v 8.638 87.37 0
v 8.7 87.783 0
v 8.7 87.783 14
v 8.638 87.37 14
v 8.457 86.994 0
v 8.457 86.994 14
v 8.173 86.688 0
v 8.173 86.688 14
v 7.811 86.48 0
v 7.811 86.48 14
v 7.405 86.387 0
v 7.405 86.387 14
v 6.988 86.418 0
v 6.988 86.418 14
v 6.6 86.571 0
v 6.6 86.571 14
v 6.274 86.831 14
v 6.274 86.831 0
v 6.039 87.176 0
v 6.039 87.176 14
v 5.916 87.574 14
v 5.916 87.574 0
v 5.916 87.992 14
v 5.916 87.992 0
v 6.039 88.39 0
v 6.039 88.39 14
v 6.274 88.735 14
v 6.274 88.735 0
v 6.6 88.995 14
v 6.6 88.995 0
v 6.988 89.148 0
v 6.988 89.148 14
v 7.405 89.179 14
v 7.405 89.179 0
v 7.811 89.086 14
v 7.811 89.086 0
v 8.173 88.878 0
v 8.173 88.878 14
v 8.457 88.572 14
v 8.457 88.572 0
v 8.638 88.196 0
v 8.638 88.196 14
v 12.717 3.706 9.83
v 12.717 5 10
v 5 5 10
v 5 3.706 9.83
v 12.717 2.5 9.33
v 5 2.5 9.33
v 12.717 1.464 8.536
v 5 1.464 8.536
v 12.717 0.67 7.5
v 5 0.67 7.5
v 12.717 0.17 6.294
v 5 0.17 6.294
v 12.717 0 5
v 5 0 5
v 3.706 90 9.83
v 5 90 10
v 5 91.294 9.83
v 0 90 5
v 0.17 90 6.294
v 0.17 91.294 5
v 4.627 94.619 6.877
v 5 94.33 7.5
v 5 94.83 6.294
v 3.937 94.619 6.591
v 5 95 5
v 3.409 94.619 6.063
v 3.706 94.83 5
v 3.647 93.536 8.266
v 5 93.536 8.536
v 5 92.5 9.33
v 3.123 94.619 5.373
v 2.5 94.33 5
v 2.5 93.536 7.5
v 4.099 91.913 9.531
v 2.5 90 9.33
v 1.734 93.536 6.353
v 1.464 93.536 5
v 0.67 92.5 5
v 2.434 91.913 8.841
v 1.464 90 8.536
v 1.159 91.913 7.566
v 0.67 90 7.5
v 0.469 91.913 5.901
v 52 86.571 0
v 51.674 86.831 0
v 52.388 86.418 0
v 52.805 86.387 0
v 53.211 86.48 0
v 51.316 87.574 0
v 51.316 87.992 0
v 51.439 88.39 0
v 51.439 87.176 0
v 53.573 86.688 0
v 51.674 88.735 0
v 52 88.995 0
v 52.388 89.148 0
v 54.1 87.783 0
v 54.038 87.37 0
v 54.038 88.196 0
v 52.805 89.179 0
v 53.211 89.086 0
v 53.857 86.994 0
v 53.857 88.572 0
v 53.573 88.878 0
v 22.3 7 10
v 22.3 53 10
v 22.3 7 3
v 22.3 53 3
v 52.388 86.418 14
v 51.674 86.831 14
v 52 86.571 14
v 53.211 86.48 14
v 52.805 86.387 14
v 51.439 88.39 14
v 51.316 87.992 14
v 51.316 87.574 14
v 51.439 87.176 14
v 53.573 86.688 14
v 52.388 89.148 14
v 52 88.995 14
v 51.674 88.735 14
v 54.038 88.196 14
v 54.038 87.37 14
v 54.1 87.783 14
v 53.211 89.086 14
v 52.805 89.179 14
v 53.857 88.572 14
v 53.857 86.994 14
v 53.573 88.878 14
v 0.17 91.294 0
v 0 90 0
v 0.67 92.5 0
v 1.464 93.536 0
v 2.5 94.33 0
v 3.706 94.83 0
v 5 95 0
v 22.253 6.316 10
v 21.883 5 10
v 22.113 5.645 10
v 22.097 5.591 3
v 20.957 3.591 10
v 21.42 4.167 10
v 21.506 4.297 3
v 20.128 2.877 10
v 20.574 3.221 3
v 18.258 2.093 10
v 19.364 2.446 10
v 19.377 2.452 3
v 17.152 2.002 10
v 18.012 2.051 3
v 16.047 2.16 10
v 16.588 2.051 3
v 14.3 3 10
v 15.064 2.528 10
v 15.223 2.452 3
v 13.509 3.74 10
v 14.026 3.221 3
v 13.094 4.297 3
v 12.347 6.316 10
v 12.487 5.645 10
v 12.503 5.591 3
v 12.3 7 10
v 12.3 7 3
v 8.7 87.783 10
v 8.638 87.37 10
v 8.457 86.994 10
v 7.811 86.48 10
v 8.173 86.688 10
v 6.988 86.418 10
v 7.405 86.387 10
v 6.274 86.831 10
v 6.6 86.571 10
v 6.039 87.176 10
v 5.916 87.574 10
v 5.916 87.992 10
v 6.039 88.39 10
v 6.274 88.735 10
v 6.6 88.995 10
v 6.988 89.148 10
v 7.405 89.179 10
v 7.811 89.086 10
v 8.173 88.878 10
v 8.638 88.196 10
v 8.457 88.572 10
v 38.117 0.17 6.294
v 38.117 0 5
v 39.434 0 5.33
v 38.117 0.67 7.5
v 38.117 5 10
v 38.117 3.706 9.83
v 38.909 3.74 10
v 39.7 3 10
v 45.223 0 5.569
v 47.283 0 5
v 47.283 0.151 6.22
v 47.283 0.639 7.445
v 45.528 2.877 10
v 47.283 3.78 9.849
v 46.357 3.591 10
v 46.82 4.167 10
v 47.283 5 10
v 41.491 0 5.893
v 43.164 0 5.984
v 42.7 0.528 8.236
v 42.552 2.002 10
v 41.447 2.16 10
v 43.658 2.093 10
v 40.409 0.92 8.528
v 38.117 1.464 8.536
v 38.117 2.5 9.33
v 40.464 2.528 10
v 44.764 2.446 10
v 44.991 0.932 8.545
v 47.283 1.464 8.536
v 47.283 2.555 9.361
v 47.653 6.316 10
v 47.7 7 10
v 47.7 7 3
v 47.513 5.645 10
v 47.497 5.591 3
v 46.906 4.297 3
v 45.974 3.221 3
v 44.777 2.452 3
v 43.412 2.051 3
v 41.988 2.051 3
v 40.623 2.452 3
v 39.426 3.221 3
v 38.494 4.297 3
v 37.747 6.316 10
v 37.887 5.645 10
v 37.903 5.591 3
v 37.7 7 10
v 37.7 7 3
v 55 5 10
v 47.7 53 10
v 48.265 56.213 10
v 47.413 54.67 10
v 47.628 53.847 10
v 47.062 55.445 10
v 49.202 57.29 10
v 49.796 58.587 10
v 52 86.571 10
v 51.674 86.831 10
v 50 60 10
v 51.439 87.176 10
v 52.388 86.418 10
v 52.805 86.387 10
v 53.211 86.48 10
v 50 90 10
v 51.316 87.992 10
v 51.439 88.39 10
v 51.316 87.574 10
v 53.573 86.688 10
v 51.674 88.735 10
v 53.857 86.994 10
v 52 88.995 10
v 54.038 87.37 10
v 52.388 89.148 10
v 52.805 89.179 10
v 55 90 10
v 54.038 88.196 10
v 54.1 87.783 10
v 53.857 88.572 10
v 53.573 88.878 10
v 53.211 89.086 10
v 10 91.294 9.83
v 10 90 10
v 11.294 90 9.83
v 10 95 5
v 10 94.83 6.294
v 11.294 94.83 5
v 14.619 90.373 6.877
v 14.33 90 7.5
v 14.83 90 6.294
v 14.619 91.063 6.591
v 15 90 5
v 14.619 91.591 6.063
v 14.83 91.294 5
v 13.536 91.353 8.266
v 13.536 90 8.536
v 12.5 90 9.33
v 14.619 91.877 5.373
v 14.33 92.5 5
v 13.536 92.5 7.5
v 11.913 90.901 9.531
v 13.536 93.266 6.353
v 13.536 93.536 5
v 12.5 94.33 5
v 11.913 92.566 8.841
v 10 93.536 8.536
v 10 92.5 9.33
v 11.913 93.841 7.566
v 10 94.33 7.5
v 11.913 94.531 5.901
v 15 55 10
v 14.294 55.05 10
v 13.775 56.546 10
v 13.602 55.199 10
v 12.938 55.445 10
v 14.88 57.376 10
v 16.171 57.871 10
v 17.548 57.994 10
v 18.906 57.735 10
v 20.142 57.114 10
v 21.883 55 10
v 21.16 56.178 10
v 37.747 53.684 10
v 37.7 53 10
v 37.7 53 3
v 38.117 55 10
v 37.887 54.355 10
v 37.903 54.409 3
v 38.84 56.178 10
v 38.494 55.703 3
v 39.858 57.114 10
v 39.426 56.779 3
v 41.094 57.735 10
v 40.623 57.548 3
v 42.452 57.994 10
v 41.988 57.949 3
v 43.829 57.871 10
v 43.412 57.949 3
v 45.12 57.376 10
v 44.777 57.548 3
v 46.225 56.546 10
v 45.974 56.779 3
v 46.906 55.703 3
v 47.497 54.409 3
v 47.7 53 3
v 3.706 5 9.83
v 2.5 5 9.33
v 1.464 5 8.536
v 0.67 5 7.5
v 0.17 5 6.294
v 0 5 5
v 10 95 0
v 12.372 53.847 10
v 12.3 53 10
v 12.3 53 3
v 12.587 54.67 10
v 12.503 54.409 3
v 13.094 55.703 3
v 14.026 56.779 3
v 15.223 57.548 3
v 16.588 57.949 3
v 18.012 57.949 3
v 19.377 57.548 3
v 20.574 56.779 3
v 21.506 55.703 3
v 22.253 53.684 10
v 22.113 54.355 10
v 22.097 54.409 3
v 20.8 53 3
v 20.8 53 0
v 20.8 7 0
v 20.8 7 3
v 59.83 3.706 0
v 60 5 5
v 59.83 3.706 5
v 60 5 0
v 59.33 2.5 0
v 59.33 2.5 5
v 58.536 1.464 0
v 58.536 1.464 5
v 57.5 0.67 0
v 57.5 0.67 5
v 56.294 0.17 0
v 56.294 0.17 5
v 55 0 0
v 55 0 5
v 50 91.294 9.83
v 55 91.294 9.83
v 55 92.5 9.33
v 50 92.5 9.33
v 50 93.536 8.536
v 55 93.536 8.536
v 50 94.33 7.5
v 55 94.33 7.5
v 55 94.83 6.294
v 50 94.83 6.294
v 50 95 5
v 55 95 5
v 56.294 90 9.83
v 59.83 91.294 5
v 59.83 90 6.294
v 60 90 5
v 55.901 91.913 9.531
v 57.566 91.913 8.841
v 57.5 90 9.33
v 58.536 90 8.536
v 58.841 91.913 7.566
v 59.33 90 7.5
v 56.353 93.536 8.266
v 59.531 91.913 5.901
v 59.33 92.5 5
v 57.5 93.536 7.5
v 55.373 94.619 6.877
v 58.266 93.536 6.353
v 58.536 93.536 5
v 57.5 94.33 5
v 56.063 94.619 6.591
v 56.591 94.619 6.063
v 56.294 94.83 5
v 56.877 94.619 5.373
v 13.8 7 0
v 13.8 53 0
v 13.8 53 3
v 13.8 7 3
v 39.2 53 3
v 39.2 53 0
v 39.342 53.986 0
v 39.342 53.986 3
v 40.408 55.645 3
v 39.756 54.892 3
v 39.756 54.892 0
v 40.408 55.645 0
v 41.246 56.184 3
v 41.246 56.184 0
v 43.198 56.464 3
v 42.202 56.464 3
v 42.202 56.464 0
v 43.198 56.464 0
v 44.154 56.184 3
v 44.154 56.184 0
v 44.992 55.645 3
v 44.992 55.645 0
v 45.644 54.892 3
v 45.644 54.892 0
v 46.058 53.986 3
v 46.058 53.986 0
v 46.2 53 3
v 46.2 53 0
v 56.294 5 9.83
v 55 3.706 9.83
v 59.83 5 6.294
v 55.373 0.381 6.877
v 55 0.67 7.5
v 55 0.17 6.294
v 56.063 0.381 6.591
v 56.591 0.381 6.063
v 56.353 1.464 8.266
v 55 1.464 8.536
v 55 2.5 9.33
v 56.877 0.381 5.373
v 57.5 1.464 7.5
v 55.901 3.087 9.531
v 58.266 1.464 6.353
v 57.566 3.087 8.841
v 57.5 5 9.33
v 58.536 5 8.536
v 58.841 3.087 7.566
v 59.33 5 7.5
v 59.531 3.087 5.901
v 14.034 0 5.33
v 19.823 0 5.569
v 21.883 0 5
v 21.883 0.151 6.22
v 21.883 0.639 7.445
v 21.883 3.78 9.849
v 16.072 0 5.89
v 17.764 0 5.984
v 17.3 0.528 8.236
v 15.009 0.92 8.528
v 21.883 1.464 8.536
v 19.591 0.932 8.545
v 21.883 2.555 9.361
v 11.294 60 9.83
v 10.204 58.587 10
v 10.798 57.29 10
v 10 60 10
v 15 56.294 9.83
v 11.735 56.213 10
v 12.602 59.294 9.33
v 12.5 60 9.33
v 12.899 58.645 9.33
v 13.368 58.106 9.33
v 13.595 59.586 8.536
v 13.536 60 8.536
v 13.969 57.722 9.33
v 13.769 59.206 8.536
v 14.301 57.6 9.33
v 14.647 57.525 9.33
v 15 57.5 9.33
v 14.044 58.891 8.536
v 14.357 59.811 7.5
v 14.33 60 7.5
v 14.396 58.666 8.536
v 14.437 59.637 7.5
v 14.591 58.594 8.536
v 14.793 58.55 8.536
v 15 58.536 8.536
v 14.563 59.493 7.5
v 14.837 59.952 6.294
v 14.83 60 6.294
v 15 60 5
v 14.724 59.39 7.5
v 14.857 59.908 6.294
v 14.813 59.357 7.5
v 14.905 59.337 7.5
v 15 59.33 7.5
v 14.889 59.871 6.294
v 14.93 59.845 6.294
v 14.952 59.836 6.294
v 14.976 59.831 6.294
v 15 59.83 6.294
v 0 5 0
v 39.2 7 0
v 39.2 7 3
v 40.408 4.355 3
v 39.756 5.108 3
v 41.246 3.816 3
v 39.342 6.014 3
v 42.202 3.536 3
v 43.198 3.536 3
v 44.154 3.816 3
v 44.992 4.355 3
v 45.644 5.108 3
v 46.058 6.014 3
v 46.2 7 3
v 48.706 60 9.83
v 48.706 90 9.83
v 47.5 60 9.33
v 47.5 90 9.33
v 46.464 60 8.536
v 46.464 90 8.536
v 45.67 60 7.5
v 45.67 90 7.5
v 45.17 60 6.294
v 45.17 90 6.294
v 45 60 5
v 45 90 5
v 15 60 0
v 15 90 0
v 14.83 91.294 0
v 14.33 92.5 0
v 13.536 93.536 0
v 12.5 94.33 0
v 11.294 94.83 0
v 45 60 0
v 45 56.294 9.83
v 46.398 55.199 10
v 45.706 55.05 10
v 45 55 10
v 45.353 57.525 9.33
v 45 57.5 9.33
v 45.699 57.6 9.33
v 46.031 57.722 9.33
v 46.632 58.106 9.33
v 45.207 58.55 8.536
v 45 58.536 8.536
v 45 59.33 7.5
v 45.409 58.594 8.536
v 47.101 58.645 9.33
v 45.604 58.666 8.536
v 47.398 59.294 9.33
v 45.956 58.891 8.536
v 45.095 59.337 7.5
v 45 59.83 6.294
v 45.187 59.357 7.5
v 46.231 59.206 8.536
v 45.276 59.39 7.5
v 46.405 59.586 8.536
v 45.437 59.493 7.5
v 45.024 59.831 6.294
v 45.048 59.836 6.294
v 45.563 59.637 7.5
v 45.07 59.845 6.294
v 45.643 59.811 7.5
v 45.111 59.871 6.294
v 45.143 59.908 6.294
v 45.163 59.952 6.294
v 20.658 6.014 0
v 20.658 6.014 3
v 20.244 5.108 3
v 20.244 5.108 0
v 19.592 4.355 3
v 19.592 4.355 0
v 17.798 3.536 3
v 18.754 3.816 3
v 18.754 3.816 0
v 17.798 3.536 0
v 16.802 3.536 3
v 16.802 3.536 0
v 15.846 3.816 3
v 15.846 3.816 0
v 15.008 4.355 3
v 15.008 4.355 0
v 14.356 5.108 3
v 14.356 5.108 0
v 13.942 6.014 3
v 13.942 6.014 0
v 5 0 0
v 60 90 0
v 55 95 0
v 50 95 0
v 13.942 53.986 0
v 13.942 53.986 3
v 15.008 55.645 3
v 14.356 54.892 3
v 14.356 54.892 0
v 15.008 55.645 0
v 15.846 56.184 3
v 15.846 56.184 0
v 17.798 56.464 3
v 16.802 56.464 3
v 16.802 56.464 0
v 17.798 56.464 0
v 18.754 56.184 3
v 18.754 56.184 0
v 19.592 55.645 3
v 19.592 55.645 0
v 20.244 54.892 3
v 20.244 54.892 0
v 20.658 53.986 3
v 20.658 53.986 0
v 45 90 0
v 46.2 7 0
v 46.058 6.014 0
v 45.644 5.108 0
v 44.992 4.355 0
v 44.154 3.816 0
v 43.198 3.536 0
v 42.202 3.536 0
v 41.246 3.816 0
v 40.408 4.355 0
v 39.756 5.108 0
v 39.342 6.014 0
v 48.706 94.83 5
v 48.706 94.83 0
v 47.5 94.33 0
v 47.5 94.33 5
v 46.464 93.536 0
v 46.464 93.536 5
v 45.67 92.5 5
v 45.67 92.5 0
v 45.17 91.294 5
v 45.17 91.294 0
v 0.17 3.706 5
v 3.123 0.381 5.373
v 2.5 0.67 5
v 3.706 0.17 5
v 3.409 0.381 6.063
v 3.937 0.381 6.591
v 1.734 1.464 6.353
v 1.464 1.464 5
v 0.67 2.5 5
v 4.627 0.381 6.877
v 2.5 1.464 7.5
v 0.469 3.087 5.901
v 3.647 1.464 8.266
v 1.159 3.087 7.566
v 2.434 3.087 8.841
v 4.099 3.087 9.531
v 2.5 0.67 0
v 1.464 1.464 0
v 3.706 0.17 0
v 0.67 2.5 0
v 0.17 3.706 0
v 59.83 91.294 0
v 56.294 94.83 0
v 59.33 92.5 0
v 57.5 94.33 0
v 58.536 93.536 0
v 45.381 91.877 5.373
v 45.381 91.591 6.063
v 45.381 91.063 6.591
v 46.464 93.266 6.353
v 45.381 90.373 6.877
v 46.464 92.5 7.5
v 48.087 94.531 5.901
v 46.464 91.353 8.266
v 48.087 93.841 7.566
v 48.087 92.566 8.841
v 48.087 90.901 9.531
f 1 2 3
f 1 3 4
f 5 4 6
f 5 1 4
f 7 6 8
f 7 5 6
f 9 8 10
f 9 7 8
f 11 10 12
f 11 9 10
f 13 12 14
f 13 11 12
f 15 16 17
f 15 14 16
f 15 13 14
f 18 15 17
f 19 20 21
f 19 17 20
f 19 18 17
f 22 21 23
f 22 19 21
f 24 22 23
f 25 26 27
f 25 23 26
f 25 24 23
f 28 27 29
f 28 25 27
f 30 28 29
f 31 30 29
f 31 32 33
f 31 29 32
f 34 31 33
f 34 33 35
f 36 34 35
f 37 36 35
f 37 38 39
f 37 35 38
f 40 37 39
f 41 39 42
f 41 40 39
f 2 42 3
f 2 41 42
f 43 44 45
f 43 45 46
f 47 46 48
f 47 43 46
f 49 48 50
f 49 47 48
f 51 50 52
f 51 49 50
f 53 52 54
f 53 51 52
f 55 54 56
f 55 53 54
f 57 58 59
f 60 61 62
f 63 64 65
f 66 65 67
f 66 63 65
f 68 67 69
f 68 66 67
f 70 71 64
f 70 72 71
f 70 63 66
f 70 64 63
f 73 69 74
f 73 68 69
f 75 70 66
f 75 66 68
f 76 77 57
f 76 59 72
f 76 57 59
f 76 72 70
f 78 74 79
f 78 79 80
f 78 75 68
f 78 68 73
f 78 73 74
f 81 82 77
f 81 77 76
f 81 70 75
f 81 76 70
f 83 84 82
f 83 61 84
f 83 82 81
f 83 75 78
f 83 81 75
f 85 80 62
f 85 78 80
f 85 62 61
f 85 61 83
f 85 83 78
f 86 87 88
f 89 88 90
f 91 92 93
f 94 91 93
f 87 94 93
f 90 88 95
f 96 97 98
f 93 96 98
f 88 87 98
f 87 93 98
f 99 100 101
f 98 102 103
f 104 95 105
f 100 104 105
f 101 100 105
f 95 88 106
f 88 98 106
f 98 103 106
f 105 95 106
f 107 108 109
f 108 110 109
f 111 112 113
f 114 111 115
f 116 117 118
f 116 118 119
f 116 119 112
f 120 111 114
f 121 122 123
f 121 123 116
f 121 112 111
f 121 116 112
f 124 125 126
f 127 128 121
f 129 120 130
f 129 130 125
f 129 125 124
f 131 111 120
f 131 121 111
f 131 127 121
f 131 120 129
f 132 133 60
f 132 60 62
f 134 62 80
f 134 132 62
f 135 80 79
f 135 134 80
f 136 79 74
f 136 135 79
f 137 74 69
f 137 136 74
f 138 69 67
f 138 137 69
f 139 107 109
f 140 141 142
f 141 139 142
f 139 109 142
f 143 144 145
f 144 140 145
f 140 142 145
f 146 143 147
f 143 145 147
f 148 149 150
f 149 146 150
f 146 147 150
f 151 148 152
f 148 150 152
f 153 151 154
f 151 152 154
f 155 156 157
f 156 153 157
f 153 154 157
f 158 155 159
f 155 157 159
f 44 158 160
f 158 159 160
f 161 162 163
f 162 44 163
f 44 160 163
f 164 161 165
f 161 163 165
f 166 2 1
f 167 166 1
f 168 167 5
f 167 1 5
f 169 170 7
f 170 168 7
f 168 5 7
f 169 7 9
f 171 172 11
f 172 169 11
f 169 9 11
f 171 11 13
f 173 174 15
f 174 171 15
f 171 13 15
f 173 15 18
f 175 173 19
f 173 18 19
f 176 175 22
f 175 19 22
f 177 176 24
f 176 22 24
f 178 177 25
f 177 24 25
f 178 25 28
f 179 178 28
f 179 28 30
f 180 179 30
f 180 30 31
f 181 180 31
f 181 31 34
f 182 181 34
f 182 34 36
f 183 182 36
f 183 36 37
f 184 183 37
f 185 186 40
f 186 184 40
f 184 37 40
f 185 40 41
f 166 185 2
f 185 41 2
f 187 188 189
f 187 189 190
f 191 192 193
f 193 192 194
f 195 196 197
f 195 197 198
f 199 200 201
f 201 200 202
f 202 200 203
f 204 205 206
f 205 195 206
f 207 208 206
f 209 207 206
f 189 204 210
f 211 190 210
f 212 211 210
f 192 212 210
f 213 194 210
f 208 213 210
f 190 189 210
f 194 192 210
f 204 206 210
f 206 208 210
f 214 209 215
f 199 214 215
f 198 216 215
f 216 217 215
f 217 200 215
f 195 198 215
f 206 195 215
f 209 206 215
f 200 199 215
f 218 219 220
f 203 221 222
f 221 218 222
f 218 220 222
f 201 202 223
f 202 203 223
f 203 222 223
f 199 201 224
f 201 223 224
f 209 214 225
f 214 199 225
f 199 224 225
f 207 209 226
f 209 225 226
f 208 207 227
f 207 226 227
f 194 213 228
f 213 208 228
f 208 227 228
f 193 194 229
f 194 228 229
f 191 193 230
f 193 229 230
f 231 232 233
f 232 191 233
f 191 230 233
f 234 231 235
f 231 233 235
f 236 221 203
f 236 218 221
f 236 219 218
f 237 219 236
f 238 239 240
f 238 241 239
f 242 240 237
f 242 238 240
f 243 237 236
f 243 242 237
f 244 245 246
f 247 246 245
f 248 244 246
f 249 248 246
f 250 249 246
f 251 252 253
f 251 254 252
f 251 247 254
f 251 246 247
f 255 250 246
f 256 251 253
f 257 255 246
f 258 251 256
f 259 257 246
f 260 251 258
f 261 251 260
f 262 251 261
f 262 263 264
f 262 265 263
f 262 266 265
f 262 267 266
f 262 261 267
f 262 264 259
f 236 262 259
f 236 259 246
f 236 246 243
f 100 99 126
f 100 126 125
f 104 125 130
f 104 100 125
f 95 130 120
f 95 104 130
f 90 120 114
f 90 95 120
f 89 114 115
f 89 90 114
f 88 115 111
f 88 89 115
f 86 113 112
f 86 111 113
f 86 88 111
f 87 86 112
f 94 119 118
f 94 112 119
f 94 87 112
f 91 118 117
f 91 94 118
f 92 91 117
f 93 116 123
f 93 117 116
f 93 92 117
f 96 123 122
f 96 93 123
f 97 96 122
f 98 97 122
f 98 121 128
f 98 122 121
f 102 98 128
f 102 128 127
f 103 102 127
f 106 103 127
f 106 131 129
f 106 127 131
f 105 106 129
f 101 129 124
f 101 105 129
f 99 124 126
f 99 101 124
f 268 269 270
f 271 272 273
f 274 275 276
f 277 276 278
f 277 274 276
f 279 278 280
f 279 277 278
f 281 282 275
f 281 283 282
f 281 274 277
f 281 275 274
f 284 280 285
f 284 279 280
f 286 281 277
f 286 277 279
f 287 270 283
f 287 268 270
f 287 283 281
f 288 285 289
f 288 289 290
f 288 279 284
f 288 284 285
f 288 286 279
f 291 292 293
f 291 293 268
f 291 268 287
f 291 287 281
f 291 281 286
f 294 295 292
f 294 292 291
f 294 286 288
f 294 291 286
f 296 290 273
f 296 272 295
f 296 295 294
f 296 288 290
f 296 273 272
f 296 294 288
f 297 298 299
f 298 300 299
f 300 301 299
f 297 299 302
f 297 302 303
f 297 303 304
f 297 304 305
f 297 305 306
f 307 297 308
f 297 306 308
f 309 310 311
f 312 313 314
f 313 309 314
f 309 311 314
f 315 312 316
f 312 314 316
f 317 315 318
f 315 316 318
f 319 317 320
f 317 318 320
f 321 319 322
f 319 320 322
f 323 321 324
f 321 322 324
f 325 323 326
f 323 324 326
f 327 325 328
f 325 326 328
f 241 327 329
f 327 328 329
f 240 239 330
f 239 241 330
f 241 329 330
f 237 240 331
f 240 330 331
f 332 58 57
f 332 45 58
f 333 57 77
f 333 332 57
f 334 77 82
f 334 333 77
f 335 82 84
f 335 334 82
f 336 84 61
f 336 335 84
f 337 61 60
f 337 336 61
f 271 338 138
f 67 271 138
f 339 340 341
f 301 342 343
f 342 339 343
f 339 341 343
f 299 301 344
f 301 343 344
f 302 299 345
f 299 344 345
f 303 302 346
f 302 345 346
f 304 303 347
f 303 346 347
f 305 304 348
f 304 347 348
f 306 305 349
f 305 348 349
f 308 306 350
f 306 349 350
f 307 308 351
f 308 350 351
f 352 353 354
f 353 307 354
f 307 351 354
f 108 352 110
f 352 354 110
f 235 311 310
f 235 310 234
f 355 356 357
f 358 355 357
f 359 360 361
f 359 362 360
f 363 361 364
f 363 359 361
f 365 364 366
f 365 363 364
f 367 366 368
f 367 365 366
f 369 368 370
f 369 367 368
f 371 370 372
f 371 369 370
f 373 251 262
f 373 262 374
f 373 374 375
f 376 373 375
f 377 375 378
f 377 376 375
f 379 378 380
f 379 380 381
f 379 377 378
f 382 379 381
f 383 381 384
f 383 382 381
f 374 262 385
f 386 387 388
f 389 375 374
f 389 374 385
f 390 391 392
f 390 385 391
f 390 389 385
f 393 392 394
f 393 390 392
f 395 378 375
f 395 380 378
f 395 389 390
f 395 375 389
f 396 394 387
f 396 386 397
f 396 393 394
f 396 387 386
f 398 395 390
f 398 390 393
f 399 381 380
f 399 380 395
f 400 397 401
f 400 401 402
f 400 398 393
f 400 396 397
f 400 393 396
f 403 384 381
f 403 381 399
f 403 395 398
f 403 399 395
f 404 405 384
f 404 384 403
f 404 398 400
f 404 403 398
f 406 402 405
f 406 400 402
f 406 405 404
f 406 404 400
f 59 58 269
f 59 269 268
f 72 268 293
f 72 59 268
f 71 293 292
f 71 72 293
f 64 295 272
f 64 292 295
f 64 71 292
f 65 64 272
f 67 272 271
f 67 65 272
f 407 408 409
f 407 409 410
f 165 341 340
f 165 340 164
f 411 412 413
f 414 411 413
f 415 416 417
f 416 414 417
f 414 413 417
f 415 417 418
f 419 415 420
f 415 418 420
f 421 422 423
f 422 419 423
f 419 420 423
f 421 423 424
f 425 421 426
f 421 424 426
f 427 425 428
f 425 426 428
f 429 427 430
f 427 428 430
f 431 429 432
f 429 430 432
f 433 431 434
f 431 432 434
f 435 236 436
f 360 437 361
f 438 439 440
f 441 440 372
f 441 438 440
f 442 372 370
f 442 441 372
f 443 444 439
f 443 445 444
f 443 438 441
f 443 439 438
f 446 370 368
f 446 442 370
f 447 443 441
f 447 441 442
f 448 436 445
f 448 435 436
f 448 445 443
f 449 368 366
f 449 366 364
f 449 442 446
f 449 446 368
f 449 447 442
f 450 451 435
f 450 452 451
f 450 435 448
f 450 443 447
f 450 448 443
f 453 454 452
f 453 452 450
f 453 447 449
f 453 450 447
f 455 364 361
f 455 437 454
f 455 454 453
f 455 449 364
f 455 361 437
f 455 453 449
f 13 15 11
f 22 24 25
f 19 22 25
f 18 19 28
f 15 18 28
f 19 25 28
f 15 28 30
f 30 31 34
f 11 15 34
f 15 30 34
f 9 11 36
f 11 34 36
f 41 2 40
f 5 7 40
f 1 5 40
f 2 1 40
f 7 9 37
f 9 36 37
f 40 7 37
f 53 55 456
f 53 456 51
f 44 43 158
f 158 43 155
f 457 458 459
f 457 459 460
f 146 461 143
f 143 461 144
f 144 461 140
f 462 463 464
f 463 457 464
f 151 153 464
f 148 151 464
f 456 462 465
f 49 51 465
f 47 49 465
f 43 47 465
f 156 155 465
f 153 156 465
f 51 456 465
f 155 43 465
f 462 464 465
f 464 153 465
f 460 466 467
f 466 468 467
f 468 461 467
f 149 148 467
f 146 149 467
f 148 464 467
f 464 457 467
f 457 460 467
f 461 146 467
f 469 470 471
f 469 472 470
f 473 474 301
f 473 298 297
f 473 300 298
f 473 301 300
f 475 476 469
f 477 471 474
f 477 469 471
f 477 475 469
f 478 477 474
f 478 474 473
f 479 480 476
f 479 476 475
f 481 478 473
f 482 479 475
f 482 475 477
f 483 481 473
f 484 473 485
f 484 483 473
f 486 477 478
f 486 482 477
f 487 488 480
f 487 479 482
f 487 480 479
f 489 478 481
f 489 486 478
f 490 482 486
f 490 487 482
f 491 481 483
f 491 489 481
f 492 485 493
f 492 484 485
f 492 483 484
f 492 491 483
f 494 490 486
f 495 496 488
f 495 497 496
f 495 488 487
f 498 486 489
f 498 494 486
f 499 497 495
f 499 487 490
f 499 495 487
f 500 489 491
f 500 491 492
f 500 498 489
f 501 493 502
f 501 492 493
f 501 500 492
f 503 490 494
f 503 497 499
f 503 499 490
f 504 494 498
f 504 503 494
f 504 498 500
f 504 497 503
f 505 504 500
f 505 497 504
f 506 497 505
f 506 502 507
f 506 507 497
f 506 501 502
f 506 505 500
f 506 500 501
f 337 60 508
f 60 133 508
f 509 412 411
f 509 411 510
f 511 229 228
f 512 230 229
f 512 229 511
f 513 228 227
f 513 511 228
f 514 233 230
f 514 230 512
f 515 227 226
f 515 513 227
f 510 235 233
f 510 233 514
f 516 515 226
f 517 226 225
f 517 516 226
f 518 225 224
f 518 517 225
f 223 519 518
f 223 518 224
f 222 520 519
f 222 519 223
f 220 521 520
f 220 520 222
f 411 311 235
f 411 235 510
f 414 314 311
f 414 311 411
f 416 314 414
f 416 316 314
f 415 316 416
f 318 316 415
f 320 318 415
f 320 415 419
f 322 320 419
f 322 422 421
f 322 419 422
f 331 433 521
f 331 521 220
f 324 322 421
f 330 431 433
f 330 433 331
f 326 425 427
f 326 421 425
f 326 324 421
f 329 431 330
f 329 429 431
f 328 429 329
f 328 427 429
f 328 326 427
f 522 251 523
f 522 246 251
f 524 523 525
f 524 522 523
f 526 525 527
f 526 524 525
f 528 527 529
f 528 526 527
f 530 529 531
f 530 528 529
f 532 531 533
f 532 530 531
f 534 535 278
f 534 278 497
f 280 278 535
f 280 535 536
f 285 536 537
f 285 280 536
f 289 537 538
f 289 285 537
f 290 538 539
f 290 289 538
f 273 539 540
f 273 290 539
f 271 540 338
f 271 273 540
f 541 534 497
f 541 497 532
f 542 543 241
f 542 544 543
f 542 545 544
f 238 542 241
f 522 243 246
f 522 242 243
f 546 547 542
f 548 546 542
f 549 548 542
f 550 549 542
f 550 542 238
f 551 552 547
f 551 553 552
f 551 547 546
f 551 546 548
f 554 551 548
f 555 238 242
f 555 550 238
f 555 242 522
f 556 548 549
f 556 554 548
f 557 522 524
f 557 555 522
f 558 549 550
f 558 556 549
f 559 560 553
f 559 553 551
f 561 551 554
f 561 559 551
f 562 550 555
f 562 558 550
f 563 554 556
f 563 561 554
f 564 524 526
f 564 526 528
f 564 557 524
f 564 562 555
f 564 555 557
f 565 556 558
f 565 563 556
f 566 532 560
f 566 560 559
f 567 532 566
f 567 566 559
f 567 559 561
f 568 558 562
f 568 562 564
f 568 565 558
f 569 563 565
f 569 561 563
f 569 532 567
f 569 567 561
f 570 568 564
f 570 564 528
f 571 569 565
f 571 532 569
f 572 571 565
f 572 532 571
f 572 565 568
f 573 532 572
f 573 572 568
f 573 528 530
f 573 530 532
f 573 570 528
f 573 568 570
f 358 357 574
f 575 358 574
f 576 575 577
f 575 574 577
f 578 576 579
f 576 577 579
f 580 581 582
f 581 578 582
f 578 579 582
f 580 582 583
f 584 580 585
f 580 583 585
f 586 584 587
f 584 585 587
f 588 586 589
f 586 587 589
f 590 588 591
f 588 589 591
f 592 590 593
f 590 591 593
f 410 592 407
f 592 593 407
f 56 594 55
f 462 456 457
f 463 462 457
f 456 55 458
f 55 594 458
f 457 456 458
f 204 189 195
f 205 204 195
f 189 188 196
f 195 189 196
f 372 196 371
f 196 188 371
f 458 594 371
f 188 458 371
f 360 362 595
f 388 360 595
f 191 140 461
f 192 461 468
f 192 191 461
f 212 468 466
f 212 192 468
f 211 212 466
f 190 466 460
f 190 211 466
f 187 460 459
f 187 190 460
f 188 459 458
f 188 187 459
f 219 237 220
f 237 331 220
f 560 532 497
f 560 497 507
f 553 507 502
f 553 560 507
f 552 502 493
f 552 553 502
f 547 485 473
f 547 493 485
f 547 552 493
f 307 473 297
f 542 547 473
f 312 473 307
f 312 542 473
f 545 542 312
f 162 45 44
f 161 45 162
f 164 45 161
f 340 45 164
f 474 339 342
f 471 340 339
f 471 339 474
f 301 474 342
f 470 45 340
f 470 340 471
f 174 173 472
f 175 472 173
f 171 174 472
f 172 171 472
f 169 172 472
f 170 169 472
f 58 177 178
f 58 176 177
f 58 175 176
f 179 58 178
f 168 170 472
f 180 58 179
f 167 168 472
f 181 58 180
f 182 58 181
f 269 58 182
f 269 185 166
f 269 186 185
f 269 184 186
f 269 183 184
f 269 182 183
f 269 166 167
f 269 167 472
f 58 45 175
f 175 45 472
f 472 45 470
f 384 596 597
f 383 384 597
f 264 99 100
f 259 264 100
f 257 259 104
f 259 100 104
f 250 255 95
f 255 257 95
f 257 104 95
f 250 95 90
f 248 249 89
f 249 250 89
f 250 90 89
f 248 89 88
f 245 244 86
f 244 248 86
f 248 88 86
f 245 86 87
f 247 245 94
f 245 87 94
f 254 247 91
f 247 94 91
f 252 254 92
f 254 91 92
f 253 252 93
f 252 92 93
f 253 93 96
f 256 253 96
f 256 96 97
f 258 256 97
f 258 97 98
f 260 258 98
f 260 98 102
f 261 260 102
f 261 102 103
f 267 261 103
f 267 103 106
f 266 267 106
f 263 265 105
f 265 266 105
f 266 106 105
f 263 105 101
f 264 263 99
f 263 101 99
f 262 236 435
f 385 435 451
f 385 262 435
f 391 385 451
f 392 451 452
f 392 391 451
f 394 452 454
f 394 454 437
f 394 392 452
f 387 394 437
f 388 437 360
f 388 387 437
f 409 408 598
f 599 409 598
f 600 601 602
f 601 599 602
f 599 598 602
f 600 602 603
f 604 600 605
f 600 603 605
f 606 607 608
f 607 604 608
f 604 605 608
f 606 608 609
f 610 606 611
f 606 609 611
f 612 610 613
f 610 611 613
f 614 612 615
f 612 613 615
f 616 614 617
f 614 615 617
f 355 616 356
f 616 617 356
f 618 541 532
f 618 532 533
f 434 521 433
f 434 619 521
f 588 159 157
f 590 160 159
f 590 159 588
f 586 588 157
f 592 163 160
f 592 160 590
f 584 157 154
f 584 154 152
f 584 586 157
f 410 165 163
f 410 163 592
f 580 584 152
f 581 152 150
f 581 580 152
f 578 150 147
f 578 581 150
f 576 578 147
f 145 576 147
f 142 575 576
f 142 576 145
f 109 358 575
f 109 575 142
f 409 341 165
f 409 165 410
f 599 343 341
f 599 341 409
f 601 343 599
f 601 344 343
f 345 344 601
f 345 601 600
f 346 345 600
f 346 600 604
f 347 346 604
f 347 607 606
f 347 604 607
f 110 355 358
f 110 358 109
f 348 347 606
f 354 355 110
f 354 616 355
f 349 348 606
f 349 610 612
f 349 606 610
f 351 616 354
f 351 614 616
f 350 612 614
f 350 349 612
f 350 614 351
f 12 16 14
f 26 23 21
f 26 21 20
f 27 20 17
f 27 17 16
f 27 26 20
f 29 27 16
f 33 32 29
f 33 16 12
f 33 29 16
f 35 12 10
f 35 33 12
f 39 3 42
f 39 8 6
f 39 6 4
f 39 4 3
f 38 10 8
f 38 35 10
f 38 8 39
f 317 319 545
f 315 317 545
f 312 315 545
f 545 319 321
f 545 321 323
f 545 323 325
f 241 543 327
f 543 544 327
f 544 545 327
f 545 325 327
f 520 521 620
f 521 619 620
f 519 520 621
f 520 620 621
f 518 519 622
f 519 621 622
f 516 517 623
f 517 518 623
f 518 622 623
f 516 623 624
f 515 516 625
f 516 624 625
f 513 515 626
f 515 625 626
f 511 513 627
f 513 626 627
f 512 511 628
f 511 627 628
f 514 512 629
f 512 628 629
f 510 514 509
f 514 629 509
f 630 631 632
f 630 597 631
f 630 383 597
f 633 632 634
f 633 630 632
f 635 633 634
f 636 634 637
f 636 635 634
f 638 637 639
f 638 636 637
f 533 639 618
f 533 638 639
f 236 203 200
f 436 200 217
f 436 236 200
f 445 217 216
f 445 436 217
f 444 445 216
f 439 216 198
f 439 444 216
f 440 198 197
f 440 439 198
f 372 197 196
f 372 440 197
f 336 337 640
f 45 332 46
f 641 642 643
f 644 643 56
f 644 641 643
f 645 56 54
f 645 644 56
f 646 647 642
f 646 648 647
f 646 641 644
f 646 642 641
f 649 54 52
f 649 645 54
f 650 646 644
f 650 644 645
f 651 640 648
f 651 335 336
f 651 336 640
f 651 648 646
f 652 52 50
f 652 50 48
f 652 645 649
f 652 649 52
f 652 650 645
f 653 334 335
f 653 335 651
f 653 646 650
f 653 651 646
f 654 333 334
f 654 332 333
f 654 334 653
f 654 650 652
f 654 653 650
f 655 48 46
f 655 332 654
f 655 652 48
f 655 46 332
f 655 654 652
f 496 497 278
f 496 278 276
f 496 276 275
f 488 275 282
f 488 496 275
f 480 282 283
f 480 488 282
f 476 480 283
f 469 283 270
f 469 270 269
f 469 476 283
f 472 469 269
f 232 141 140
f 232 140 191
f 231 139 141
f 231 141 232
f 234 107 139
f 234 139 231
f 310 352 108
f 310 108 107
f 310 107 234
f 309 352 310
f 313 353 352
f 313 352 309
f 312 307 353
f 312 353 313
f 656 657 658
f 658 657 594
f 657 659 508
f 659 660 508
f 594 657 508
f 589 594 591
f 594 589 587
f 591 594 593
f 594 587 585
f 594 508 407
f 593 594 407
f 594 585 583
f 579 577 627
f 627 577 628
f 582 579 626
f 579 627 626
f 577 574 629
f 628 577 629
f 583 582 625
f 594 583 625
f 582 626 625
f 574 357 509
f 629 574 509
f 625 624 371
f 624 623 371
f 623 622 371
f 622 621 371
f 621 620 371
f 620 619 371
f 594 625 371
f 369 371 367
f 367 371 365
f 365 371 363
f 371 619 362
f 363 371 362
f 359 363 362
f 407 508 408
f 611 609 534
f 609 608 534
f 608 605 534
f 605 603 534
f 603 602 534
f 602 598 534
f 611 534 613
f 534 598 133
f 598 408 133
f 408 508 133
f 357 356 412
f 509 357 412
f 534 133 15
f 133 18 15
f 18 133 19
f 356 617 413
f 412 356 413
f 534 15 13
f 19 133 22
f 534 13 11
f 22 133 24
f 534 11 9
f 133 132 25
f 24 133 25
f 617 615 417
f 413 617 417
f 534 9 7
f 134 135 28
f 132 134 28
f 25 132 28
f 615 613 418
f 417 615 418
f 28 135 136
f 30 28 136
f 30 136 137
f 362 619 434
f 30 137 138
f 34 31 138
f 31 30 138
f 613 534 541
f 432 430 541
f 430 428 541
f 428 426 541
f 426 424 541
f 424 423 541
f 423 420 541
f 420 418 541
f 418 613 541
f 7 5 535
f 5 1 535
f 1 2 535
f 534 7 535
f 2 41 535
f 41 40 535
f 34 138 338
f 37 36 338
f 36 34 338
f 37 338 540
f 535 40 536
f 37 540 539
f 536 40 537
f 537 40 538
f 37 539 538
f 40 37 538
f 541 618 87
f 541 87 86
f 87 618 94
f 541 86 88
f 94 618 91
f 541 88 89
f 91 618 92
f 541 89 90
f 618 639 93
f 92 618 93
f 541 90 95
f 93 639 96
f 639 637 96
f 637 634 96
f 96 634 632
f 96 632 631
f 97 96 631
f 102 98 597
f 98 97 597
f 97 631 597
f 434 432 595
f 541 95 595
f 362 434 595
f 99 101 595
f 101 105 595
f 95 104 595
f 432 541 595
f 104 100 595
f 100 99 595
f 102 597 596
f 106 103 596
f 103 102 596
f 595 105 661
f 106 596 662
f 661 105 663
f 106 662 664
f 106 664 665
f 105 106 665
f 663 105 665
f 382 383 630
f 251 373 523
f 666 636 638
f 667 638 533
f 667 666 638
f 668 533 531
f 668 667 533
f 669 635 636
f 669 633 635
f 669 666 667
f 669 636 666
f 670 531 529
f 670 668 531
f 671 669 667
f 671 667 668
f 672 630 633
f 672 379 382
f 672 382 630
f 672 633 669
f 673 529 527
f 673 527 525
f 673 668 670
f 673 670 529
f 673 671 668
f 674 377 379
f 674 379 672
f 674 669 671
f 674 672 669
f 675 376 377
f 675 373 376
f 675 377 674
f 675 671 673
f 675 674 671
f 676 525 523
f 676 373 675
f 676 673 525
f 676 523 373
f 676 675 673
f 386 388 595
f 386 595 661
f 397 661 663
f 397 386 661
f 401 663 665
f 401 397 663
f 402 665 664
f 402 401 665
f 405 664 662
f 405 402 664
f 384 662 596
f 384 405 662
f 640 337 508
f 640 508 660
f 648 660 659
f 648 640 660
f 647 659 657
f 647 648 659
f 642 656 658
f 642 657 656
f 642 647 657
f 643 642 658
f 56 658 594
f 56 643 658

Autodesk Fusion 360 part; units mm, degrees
sketch "Sketch1" plane through (0, 0, 0) normal (0, 0, 1) x (1, 0, 0)
  line L0 (0, 0) -> (60, 0)
  line L1 (60, 0) -> (60, 95)
  line L2 (60, 95) -> (0, 95)
  line L3 (0, 95) -> (0, 0)
  line L4 (60, 60) -> (0, 60) construction
  line L5 (0, 0) -> (60, 60) construction
  line L6 (0, 60) -> (60, 0) construction
  line L7 (30, 30) -> (30, 60) construction
  line L8 (30, 30) -> (30, 0) construction
  line L9 (42.7, 60) -> (42.7, 0) construction
  line L10 (17.3, 60) -> (17.3, 0) construction
  line L11 (45, 95) -> (45, 60) construction
  line L12 (15, 95) -> (15, 60) construction
  line L13 (52.7, 95) -> (52.7, 60) construction
  line L14 (7.3, 95) -> (7.3, 60) construction
  line L15 (60, 87.783) -> (0, 87.783) construction
  circle A0 centre (52.7, 87.783) radius 1.4
  circle A1 centre (7.3, 87.783) radius 1.4
  line L16 (15, 95) -> (15, 60)
  line L17 (15, 60) -> (45, 60)
  line L18 (45, 60) -> (45, 95)
  line L19 (0, 53) -> (60, 53) construction
  line L20 (0, 7) -> (60, 7) construction
  circle A2 centre (42.7, 53) radius 5
  circle A3 centre (42.7, 7) radius 5
  circle A4 centre (17.3, 7) radius 5
  circle A5 centre (17.3, 53) radius 5
  circle A6 centre (17.3, 53) radius 3.5
  circle A7 centre (17.3, 7) radius 3.5
  circle A8 centre (42.7, 53) radius 3.5
  circle A9 centre (42.7, 7) radius 3.5
  line L21 (12.3, 53) -> (12.3, 7)
  line L22 (22.3, 53) -> (22.3, 7)
  line L23 (13.8, 53) -> (13.8, 7)
  line L24 (20.8, 53) -> (20.8, 7)
  line L25 (37.7, 53) -> (37.7, 7)
  line L26 (39.2, 53) -> (39.2, 7)
  line L27 (46.2, 7) -> (46.2, 53)
  line L28 (47.7, 53) -> (47.7, 7)
  dimension "d1" = 60
  dimension "d2" = 95
  dimension "d3" = 35
  dimension "d4" = 12.7
  dimension "d5" = 12.7
  dimension "d6" = 15
  dimension "d7" = 15
  dimension "d8" = 7.3
  dimension "d9" = 7.3
  dimension "d10" = 27.783
  dimension "d11" = 2.8
  dimension "d12" = 2.8
  dimension "d13" = 7
  dimension "d14" = 7
  dimension "d15" = 10
  dimension "d16" = 10
  dimension "d17" = 10
  dimension "d18" = 10
  dimension "d19" = 7
  dimension "d20" = 7
  dimension "d21" = 7
  dimension "d22" = 7
extrude "Extrude1" add sketch "Sketch1" along normal blind 10 contours L0 L1 L2 L3 L16 L17 L18 makes body 1
extrude "Extrude2" add sketch "Sketch1" along normal blind 3 contours A2 A8 L26 L27 | A2 A3 L27 L28 | A2 A3 L25 L26 | A3 A9 L26 L27 | A4 A7 L23 L24 | A4 A5 L21 L23 | A4 A5 L22 L24 | A5 A6 L23 L24 picked at (45.1558, 56.7568) picked at (47.1684, 6.5777) picked at (21.7684, 6.5777) picked at (14.3117, 56.3488) bodies 1
extrude "Extrude3" add sketch "Sketch1" along normal blind 14 separate body contours A0 | A1 makes body 2 at (51.8828, 86.6463, 9.3333) makes body 3 at (6.0099, 87.2392, 9.3333)
fillet "Fillet1" radius 5 1 edges at (0, 47.5, 10) on bodies 1
fillet "Fillet2" radius 5 1 edges at (60, 47.5, 10) on bodies 1
fillet "Fillet3" radius 5 5 edges at (0, 0, 2.5) (1.4645, 0, 8.5355) (30, 0, 10) (58.5355, 0, 8.5355) (60, 0, 2.5) on bodies 1
fillet "Fillet4" radius 5 6 edges at (60, 95, 2.5) (58.5355, 95, 8.5355) (50, 95, 10) (10, 95, 10) (1.4645, 95, 8.5355) (0, 95, 2.5) on bodies 1
fillet "Fillet5" radius 5 7 edges at (45, 95, 2.5) (45, 93.5355, 8.5355) (45, 75, 10) (30, 60, 10) (15, 75, 10) (15, 93.5355, 8.5355) (15, 95, 2.5) on bodies 1
